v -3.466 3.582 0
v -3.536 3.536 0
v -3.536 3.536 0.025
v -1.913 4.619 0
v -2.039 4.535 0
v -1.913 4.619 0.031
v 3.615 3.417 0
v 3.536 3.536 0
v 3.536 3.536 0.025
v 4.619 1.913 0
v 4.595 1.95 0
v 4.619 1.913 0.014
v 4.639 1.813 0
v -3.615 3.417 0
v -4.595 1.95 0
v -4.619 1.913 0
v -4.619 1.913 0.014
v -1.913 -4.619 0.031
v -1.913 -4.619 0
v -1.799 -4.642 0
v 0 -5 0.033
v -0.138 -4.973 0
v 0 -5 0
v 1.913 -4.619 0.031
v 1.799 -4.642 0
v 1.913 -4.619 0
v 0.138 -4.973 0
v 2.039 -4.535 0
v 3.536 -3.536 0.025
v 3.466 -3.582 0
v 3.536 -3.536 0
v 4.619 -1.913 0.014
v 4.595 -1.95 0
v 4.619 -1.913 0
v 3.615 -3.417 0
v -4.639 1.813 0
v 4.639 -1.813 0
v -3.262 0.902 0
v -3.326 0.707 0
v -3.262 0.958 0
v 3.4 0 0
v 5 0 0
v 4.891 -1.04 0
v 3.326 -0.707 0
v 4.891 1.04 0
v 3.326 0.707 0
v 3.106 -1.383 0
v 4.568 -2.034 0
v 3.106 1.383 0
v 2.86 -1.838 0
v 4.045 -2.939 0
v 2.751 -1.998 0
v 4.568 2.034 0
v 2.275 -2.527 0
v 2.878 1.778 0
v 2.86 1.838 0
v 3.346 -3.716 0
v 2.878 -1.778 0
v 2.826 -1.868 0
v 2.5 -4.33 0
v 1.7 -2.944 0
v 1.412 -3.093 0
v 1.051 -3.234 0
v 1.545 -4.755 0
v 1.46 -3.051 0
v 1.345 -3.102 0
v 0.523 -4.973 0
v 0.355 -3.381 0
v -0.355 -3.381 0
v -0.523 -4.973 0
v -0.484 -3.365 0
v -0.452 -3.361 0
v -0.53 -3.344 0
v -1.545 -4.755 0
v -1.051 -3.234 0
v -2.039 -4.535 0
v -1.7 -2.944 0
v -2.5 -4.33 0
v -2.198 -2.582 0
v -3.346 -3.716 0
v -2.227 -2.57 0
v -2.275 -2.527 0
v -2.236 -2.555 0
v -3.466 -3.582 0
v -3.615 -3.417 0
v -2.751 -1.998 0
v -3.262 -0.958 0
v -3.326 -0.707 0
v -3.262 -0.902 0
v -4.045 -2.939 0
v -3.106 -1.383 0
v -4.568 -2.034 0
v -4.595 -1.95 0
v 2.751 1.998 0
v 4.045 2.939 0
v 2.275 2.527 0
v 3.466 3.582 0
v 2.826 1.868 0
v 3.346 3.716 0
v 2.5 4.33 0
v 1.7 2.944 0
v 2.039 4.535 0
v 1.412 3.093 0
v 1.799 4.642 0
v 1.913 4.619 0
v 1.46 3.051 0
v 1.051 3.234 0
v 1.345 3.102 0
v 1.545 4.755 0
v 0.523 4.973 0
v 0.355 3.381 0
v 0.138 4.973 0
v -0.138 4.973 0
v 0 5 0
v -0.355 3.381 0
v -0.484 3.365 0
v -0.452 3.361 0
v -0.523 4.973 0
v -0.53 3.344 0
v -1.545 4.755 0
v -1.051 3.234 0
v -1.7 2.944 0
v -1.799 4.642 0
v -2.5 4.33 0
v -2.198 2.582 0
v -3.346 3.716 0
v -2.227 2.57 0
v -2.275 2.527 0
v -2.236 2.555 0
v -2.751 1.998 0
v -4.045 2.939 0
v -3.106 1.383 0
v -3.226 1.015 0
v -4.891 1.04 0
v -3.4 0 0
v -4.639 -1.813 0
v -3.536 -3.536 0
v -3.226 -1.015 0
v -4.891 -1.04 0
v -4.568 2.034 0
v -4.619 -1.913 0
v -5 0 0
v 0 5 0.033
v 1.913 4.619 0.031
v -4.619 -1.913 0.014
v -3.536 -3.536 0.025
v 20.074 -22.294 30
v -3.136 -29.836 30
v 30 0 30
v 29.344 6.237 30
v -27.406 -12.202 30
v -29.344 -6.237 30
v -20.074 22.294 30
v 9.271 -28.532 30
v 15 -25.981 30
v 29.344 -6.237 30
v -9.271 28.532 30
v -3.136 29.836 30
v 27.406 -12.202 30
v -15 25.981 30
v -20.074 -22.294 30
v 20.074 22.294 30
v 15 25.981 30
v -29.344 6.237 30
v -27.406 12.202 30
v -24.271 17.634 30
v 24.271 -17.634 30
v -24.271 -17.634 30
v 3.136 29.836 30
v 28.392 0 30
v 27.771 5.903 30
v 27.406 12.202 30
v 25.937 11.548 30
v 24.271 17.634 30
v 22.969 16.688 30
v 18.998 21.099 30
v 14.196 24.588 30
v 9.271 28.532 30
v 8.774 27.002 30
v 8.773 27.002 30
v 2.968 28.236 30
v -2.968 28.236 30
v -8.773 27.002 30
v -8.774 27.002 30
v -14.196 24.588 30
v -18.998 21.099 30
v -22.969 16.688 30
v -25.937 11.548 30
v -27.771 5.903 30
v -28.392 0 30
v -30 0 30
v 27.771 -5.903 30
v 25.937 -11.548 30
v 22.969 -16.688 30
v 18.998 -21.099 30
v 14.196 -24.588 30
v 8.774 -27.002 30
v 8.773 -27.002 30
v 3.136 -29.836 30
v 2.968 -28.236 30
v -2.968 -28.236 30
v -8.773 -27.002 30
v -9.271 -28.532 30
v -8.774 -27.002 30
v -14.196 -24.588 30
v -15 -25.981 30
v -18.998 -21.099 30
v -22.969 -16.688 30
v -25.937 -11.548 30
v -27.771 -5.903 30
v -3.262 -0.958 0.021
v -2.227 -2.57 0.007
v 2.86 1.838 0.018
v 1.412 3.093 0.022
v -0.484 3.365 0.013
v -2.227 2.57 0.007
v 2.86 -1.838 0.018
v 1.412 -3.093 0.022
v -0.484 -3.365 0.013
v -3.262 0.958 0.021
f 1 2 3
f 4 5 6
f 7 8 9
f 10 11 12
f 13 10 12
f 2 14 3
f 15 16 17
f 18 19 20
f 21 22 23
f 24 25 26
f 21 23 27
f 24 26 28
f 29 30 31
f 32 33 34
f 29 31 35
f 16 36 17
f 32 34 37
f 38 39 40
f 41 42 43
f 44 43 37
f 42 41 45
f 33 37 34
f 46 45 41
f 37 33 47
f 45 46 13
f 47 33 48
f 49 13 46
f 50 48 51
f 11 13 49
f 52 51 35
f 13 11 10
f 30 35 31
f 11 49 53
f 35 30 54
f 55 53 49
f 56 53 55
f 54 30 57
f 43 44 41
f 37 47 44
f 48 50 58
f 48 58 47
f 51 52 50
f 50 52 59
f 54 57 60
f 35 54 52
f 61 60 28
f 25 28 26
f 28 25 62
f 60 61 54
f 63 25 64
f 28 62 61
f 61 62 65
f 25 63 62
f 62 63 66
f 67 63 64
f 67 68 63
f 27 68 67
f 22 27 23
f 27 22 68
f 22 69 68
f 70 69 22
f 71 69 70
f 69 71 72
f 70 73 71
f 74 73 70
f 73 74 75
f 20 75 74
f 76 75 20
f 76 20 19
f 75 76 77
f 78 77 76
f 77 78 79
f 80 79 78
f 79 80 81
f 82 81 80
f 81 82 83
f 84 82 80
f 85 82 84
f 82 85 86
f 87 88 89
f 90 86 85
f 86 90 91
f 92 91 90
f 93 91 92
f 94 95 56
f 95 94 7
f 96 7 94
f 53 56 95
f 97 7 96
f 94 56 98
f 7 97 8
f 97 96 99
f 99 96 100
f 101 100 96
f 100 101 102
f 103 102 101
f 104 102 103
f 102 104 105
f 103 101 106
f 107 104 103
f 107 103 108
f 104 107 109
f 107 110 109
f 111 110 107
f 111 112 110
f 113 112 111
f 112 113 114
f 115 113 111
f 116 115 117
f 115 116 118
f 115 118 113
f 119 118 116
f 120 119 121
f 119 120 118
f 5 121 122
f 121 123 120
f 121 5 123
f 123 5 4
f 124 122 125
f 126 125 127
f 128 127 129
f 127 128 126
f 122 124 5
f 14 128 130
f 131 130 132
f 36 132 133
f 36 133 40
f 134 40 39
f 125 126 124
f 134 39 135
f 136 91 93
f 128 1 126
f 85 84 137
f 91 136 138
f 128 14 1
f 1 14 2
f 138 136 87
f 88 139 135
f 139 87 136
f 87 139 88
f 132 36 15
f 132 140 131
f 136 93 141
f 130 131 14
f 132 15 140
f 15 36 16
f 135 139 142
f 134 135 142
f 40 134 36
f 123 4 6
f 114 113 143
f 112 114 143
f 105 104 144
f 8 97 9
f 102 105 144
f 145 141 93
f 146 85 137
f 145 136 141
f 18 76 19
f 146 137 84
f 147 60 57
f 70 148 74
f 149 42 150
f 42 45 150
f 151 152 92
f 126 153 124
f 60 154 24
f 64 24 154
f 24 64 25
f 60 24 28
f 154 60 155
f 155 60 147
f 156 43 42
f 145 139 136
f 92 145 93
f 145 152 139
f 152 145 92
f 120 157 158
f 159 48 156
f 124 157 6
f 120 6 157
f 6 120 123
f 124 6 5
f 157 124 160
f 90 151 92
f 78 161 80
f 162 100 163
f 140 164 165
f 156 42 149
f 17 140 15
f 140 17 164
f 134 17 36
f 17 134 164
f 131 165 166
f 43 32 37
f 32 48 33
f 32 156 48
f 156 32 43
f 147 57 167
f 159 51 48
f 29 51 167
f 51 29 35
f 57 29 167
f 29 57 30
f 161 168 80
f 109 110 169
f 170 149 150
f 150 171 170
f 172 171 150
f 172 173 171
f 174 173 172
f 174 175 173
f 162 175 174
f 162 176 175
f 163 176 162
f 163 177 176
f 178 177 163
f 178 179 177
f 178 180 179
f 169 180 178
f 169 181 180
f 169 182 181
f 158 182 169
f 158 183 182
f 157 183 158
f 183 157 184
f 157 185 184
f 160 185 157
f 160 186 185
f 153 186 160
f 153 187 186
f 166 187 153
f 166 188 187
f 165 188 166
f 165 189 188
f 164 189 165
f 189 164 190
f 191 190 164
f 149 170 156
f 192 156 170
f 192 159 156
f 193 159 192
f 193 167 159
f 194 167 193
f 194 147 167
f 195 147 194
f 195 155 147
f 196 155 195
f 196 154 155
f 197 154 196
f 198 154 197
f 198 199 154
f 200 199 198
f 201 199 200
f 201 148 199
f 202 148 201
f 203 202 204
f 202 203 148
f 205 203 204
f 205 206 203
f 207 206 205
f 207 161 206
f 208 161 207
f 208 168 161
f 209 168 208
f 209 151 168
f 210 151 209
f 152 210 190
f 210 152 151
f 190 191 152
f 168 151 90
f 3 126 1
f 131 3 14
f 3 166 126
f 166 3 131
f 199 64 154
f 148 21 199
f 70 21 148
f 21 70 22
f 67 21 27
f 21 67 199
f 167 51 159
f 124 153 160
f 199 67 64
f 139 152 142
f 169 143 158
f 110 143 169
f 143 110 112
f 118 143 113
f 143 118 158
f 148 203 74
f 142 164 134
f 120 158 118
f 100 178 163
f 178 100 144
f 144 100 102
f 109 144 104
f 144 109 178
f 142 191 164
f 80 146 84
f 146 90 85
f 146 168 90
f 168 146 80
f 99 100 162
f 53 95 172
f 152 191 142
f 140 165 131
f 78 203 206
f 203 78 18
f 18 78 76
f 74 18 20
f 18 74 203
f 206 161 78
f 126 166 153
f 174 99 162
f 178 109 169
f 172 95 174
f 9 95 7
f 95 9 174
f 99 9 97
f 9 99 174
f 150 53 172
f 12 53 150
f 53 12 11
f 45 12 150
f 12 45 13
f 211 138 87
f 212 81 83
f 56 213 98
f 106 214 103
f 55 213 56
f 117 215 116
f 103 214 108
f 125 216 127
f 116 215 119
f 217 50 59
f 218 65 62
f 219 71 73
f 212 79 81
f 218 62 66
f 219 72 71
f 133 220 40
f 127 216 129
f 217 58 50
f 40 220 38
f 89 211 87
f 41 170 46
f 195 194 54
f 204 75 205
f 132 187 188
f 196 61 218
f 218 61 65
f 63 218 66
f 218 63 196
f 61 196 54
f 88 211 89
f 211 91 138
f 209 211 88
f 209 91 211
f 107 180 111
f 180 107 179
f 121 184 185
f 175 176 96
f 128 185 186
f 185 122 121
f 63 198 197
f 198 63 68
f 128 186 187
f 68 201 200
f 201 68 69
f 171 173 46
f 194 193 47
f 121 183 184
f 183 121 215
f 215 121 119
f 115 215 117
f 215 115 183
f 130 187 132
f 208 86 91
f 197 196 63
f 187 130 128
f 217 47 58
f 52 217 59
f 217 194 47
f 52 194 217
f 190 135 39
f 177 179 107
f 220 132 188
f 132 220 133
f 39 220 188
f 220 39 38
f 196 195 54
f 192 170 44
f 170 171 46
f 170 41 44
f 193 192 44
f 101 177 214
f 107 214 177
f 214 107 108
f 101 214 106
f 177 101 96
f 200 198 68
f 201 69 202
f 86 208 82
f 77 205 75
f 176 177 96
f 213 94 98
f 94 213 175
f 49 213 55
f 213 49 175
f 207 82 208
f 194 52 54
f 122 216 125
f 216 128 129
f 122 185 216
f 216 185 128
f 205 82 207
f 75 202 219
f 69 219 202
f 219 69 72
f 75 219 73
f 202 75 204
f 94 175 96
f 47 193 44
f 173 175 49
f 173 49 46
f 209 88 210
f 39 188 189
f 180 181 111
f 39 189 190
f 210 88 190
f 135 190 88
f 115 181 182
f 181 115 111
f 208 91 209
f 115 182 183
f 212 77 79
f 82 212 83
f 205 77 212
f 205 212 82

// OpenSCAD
// Lab funnel - printed upright (spout down, wide opening up)
// Dimensions measured with calipers

// Overall height
H_FUNNEL = 50;

// Spout dimensions
H_SPOUT = 20;
OD_SPOUT = 10;

// Cone (funnel body) dimensions
OD_RIM = 60;
H_CONE = H_FUNNEL - H_SPOUT; // 30 mm

// Wall thickness
T_WALL = 1.6;

// Derived dimensions
ID_SPOUT = OD_SPOUT - 2 * T_WALL; // 6.8 mm bore
ID_RIM = OD_RIM - 2 * T_WALL;     // 56.8 mm inner rim diameter

// Print orientation: rests on XY plane at z=0, builds upward

// Outer shape: spout cylinder + cone
difference() {
    // Outer solid (spout + cone)
    union() {
        // Spout cylinder
        cylinder(h = H_SPOUT, d = OD_SPOUT, center = false);
        
        // Cone: bottom at z=H_SPOUT, top at z=H_FUNNEL
        // Use linear_extrude of a triangle, or two stacked cylinders approximation
        // Better: use a single cone via cylinder with different top/bottom radii
        cylinder(h = H_CONE, d1 = OD_SPOUT, d2 = OD_RIM, center = false, 
                 translate = [0, 0, H_SPOUT]);
    }
    
    // Inner bore (spout + cone) - extend slightly past faces
    union() {
        // Spout bore
        cylinder(h = H_SPOUT + 0.01, d = ID_SPOUT, center = false);
        
        // Cone bore: extends from z=H_SPOUT to z=H_FUNNEL+0.01
        cylinder(h = H_CONE + 0.01, d1 = ID_SPOUT, d2 = ID_RIM, center = false,
                 translate = [0, 0, H_SPOUT - 0.01]);
    }
}
